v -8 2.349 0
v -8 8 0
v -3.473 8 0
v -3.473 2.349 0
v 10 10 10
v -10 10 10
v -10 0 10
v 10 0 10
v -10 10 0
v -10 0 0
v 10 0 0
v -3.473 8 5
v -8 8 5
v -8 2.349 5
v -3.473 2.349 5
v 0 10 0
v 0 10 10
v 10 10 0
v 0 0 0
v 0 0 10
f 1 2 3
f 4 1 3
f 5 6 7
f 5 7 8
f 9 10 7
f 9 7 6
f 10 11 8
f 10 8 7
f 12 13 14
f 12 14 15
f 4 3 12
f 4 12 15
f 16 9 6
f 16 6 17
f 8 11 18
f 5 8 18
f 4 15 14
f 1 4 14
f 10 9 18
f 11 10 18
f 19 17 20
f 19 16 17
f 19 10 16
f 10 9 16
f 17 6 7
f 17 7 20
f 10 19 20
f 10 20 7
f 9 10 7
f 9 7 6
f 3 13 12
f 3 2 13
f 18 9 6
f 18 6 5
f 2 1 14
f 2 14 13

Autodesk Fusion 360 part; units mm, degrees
sketch "Sketch1" plane through (0, 0, 0) normal (0, 0, 1) x (1, 0, 0)
  line L0 (0, 0) -> (-10, 0)
  line L1 (-10, 0) -> (-10, 10)
  line L2 (-10, 10) -> (0, 10)
  line L3 (0, 10) -> (0, 0)
  line L4 (-8, 8) -> (-3.4733, 8)
  line L5 (-3.4733, 8) -> (-3.4733, 2.3489)
  line L6 (-3.4733, 2.3489) -> (-8, 2.3489)
  line L7 (-8, 2.3489) -> (-8, 8)
  line L8 (-10, 0) -> (10, 0)
  line L9 (10, 0) -> (10, 10)
  line L10 (10, 10) -> (-10, 10)
  line L11 (-10, 10) -> (-10, 0)
extrude "Extrude1" add sketch "Sketch1" along normal blind 10 contours L0 L1 L2 L3 L8 L10 L11 | L3 L8 L9 L10 | L4 L5 L6 L7 makes body 1
extrude "Extrude1'" add sketch "Sketch1" along normal blind 10 separate body contours L0 L1 L2 L3 L8 L10 L11 | L4 L5 L6 L7 makes body 2 in component "Tool"
extrude "Extrude2" add sketch "Sketch1" along normal blind 5 separate body contours L4 L5 L6 L7 makes body 3 in component "Tool"
component "Tool" placed x (1, 0, 0) y (0, 1, 0) z (0, 0, 1) at (0, 0, 0)
